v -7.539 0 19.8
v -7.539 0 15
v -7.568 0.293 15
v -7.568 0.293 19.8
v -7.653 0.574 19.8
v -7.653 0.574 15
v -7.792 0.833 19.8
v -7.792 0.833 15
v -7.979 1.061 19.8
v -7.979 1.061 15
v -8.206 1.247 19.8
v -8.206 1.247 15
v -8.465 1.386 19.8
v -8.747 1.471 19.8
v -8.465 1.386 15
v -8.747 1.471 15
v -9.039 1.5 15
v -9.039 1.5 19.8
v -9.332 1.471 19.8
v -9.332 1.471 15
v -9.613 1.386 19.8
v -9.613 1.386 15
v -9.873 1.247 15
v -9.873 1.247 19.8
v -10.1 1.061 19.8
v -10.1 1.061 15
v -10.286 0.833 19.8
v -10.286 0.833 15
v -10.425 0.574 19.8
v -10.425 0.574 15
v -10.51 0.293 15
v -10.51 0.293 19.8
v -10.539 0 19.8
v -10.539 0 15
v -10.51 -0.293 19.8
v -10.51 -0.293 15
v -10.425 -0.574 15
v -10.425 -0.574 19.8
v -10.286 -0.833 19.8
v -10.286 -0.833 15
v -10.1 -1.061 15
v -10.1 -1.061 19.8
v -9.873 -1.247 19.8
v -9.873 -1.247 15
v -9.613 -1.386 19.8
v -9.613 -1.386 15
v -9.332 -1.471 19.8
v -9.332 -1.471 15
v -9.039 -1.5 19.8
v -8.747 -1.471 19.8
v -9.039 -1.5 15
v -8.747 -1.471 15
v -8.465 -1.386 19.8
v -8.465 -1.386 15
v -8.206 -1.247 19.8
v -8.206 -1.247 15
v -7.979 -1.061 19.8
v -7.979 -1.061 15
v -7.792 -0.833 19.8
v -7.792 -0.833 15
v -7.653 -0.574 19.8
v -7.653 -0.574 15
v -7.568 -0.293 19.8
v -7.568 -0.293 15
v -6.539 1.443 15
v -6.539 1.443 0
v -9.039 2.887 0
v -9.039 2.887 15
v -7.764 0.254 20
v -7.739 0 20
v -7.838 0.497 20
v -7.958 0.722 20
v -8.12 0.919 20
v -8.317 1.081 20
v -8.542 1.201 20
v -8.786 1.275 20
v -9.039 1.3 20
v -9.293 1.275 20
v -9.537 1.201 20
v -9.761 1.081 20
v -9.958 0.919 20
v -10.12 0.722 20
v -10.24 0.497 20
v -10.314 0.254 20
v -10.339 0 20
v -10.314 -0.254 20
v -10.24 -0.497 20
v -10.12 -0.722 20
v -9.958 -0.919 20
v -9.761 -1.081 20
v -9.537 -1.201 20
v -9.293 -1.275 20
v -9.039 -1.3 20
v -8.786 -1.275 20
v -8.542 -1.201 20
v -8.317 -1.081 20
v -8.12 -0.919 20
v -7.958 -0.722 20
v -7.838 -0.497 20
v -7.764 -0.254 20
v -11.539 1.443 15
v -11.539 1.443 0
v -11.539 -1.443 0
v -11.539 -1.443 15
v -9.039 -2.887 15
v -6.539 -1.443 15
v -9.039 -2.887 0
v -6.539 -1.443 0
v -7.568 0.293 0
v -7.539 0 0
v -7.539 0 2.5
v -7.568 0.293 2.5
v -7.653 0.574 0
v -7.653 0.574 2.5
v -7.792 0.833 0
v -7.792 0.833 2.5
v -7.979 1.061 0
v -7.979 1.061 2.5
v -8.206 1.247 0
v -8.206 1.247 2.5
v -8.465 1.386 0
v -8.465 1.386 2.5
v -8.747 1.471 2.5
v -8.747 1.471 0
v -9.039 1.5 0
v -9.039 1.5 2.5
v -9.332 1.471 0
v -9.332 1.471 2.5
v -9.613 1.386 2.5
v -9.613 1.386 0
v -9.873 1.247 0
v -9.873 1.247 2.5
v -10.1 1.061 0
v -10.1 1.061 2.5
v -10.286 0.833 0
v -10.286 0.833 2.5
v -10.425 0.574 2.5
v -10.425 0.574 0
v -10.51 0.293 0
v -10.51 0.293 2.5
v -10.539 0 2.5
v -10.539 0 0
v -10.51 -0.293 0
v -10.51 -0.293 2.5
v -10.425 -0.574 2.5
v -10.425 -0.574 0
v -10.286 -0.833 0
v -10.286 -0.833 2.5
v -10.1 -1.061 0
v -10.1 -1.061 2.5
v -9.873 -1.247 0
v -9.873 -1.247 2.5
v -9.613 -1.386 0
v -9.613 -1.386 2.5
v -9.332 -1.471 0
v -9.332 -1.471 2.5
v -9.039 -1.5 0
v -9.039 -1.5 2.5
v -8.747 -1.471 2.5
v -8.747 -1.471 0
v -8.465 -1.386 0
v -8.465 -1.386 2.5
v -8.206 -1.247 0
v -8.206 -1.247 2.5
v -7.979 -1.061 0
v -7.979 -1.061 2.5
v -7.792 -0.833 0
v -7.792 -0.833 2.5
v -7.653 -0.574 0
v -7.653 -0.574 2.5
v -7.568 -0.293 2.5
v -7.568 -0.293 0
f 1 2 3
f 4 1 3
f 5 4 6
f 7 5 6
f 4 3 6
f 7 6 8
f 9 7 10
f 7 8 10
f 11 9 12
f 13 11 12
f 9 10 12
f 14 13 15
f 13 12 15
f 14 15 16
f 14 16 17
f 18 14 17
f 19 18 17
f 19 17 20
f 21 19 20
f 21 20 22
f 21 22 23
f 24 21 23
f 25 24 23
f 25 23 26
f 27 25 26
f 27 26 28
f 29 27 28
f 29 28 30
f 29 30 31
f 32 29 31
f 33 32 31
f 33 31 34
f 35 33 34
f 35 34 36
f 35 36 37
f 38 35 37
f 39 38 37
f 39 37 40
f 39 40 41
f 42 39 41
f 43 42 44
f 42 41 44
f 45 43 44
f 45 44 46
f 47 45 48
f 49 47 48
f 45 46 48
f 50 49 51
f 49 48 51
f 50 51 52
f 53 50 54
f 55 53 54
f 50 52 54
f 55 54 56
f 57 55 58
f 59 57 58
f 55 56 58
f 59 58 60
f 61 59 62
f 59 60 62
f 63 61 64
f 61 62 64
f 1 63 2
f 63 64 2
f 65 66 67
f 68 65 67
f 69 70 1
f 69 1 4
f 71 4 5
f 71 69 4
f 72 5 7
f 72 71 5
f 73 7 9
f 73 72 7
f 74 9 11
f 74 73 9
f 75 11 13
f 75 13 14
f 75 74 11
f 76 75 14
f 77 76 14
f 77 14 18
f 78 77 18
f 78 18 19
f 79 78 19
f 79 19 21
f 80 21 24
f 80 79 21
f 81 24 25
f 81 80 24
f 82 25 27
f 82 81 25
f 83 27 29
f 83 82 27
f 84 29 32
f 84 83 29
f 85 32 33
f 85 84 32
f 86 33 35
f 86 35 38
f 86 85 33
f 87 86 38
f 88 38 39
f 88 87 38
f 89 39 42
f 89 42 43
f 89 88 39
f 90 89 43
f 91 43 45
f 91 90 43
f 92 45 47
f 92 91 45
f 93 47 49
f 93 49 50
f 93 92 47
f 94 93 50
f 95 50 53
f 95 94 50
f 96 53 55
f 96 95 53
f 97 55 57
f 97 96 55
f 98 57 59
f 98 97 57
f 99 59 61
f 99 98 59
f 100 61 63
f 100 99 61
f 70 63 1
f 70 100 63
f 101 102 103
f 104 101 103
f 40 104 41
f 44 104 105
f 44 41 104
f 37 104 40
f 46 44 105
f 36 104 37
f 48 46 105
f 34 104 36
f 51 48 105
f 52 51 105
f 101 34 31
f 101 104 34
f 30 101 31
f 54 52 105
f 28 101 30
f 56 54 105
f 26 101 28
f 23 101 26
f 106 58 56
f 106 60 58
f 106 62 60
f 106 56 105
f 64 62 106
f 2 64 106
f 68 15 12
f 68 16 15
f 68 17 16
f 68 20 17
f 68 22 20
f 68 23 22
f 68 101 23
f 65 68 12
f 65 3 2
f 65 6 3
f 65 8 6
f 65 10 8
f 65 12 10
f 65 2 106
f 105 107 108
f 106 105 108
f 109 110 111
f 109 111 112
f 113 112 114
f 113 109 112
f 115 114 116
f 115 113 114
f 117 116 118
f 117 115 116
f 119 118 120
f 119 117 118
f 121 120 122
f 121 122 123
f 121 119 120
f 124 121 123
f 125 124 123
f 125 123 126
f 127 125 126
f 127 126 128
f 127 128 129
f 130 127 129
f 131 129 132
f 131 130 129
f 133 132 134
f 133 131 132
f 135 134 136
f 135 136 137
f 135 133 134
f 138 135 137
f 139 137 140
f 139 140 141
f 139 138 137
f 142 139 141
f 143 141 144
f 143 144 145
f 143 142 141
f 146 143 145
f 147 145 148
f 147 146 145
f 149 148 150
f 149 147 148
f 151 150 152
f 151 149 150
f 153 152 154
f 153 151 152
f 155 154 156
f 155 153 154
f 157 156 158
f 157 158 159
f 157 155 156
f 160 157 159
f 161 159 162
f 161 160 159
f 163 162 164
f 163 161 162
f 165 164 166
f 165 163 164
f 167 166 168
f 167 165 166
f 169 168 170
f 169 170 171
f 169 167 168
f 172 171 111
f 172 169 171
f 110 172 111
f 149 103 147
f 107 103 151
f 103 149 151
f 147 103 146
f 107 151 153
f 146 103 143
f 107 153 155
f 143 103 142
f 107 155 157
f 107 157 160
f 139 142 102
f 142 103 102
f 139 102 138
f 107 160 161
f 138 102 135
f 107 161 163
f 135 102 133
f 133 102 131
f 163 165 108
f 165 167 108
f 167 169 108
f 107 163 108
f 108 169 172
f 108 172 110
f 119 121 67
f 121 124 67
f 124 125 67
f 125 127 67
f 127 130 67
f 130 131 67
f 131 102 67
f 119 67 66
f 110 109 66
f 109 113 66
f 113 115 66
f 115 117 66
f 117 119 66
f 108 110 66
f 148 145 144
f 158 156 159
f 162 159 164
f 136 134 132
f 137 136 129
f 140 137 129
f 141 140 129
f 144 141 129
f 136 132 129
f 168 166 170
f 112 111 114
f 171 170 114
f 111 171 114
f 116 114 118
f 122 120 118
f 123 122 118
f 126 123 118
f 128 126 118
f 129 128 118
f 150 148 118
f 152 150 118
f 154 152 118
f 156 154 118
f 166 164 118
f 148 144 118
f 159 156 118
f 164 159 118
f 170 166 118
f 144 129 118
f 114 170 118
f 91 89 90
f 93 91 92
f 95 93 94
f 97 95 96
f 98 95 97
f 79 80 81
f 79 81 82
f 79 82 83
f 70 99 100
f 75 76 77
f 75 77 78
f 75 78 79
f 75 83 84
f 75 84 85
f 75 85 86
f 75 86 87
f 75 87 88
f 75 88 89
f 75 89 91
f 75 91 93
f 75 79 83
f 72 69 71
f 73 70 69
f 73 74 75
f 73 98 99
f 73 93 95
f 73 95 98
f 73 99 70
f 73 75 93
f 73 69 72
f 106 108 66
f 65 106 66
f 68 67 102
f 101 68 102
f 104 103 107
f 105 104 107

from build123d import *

# Parameters (mm, degrees)
F0_R     = 1.5
F1_DEPTH = 15
F2_DEPTH = 20
F3_SIZE  = 0.2
F4_DEPTH = 2.5


# Not quite as in the source:
# - a feature names something its author has since deleted; it is built from what else it names


with BuildPart() as f1:
    # F0 (on Top) → F1 (new body)
    with BuildSketch(Plane.XY):
        Polygon((-6.5392298422, -1.443375673), (-6.5392298422, 1.443375673), (-9.0392298422, 2.8867513459), (-11.5392298422, 1.443375673), (-11.5392298422, -1.443375673), (-9.0392298422, -2.8867513459), align=None)
        with Locations((-9.0392298422, 0)):
            Circle(F0_R, mode=Mode.SUBTRACT)
    extrude(amount=F1_DEPTH)

    # F0 (on Top) → F2 (join)
    with BuildSketch(Plane.XY):
        with Locations((-9.0392298422, 0)):
            Circle(F0_R)
    extrude(amount=F2_DEPTH)

    # F3
    f3_edges = [f1.edges().sort_by_distance(p)[0] for p in [
        (-10.53923, 0, 20),
    ]]
    chamfer(f3_edges, length=F3_SIZE)

    # F0 (on Top) → F4 (cut)
    with BuildSketch(Plane.XY):
        with Locations((-9.0392298422, 0)):
            Circle(F0_R)
    extrude(amount=F4_DEPTH, mode=Mode.SUBTRACT)


solid = f1.part
